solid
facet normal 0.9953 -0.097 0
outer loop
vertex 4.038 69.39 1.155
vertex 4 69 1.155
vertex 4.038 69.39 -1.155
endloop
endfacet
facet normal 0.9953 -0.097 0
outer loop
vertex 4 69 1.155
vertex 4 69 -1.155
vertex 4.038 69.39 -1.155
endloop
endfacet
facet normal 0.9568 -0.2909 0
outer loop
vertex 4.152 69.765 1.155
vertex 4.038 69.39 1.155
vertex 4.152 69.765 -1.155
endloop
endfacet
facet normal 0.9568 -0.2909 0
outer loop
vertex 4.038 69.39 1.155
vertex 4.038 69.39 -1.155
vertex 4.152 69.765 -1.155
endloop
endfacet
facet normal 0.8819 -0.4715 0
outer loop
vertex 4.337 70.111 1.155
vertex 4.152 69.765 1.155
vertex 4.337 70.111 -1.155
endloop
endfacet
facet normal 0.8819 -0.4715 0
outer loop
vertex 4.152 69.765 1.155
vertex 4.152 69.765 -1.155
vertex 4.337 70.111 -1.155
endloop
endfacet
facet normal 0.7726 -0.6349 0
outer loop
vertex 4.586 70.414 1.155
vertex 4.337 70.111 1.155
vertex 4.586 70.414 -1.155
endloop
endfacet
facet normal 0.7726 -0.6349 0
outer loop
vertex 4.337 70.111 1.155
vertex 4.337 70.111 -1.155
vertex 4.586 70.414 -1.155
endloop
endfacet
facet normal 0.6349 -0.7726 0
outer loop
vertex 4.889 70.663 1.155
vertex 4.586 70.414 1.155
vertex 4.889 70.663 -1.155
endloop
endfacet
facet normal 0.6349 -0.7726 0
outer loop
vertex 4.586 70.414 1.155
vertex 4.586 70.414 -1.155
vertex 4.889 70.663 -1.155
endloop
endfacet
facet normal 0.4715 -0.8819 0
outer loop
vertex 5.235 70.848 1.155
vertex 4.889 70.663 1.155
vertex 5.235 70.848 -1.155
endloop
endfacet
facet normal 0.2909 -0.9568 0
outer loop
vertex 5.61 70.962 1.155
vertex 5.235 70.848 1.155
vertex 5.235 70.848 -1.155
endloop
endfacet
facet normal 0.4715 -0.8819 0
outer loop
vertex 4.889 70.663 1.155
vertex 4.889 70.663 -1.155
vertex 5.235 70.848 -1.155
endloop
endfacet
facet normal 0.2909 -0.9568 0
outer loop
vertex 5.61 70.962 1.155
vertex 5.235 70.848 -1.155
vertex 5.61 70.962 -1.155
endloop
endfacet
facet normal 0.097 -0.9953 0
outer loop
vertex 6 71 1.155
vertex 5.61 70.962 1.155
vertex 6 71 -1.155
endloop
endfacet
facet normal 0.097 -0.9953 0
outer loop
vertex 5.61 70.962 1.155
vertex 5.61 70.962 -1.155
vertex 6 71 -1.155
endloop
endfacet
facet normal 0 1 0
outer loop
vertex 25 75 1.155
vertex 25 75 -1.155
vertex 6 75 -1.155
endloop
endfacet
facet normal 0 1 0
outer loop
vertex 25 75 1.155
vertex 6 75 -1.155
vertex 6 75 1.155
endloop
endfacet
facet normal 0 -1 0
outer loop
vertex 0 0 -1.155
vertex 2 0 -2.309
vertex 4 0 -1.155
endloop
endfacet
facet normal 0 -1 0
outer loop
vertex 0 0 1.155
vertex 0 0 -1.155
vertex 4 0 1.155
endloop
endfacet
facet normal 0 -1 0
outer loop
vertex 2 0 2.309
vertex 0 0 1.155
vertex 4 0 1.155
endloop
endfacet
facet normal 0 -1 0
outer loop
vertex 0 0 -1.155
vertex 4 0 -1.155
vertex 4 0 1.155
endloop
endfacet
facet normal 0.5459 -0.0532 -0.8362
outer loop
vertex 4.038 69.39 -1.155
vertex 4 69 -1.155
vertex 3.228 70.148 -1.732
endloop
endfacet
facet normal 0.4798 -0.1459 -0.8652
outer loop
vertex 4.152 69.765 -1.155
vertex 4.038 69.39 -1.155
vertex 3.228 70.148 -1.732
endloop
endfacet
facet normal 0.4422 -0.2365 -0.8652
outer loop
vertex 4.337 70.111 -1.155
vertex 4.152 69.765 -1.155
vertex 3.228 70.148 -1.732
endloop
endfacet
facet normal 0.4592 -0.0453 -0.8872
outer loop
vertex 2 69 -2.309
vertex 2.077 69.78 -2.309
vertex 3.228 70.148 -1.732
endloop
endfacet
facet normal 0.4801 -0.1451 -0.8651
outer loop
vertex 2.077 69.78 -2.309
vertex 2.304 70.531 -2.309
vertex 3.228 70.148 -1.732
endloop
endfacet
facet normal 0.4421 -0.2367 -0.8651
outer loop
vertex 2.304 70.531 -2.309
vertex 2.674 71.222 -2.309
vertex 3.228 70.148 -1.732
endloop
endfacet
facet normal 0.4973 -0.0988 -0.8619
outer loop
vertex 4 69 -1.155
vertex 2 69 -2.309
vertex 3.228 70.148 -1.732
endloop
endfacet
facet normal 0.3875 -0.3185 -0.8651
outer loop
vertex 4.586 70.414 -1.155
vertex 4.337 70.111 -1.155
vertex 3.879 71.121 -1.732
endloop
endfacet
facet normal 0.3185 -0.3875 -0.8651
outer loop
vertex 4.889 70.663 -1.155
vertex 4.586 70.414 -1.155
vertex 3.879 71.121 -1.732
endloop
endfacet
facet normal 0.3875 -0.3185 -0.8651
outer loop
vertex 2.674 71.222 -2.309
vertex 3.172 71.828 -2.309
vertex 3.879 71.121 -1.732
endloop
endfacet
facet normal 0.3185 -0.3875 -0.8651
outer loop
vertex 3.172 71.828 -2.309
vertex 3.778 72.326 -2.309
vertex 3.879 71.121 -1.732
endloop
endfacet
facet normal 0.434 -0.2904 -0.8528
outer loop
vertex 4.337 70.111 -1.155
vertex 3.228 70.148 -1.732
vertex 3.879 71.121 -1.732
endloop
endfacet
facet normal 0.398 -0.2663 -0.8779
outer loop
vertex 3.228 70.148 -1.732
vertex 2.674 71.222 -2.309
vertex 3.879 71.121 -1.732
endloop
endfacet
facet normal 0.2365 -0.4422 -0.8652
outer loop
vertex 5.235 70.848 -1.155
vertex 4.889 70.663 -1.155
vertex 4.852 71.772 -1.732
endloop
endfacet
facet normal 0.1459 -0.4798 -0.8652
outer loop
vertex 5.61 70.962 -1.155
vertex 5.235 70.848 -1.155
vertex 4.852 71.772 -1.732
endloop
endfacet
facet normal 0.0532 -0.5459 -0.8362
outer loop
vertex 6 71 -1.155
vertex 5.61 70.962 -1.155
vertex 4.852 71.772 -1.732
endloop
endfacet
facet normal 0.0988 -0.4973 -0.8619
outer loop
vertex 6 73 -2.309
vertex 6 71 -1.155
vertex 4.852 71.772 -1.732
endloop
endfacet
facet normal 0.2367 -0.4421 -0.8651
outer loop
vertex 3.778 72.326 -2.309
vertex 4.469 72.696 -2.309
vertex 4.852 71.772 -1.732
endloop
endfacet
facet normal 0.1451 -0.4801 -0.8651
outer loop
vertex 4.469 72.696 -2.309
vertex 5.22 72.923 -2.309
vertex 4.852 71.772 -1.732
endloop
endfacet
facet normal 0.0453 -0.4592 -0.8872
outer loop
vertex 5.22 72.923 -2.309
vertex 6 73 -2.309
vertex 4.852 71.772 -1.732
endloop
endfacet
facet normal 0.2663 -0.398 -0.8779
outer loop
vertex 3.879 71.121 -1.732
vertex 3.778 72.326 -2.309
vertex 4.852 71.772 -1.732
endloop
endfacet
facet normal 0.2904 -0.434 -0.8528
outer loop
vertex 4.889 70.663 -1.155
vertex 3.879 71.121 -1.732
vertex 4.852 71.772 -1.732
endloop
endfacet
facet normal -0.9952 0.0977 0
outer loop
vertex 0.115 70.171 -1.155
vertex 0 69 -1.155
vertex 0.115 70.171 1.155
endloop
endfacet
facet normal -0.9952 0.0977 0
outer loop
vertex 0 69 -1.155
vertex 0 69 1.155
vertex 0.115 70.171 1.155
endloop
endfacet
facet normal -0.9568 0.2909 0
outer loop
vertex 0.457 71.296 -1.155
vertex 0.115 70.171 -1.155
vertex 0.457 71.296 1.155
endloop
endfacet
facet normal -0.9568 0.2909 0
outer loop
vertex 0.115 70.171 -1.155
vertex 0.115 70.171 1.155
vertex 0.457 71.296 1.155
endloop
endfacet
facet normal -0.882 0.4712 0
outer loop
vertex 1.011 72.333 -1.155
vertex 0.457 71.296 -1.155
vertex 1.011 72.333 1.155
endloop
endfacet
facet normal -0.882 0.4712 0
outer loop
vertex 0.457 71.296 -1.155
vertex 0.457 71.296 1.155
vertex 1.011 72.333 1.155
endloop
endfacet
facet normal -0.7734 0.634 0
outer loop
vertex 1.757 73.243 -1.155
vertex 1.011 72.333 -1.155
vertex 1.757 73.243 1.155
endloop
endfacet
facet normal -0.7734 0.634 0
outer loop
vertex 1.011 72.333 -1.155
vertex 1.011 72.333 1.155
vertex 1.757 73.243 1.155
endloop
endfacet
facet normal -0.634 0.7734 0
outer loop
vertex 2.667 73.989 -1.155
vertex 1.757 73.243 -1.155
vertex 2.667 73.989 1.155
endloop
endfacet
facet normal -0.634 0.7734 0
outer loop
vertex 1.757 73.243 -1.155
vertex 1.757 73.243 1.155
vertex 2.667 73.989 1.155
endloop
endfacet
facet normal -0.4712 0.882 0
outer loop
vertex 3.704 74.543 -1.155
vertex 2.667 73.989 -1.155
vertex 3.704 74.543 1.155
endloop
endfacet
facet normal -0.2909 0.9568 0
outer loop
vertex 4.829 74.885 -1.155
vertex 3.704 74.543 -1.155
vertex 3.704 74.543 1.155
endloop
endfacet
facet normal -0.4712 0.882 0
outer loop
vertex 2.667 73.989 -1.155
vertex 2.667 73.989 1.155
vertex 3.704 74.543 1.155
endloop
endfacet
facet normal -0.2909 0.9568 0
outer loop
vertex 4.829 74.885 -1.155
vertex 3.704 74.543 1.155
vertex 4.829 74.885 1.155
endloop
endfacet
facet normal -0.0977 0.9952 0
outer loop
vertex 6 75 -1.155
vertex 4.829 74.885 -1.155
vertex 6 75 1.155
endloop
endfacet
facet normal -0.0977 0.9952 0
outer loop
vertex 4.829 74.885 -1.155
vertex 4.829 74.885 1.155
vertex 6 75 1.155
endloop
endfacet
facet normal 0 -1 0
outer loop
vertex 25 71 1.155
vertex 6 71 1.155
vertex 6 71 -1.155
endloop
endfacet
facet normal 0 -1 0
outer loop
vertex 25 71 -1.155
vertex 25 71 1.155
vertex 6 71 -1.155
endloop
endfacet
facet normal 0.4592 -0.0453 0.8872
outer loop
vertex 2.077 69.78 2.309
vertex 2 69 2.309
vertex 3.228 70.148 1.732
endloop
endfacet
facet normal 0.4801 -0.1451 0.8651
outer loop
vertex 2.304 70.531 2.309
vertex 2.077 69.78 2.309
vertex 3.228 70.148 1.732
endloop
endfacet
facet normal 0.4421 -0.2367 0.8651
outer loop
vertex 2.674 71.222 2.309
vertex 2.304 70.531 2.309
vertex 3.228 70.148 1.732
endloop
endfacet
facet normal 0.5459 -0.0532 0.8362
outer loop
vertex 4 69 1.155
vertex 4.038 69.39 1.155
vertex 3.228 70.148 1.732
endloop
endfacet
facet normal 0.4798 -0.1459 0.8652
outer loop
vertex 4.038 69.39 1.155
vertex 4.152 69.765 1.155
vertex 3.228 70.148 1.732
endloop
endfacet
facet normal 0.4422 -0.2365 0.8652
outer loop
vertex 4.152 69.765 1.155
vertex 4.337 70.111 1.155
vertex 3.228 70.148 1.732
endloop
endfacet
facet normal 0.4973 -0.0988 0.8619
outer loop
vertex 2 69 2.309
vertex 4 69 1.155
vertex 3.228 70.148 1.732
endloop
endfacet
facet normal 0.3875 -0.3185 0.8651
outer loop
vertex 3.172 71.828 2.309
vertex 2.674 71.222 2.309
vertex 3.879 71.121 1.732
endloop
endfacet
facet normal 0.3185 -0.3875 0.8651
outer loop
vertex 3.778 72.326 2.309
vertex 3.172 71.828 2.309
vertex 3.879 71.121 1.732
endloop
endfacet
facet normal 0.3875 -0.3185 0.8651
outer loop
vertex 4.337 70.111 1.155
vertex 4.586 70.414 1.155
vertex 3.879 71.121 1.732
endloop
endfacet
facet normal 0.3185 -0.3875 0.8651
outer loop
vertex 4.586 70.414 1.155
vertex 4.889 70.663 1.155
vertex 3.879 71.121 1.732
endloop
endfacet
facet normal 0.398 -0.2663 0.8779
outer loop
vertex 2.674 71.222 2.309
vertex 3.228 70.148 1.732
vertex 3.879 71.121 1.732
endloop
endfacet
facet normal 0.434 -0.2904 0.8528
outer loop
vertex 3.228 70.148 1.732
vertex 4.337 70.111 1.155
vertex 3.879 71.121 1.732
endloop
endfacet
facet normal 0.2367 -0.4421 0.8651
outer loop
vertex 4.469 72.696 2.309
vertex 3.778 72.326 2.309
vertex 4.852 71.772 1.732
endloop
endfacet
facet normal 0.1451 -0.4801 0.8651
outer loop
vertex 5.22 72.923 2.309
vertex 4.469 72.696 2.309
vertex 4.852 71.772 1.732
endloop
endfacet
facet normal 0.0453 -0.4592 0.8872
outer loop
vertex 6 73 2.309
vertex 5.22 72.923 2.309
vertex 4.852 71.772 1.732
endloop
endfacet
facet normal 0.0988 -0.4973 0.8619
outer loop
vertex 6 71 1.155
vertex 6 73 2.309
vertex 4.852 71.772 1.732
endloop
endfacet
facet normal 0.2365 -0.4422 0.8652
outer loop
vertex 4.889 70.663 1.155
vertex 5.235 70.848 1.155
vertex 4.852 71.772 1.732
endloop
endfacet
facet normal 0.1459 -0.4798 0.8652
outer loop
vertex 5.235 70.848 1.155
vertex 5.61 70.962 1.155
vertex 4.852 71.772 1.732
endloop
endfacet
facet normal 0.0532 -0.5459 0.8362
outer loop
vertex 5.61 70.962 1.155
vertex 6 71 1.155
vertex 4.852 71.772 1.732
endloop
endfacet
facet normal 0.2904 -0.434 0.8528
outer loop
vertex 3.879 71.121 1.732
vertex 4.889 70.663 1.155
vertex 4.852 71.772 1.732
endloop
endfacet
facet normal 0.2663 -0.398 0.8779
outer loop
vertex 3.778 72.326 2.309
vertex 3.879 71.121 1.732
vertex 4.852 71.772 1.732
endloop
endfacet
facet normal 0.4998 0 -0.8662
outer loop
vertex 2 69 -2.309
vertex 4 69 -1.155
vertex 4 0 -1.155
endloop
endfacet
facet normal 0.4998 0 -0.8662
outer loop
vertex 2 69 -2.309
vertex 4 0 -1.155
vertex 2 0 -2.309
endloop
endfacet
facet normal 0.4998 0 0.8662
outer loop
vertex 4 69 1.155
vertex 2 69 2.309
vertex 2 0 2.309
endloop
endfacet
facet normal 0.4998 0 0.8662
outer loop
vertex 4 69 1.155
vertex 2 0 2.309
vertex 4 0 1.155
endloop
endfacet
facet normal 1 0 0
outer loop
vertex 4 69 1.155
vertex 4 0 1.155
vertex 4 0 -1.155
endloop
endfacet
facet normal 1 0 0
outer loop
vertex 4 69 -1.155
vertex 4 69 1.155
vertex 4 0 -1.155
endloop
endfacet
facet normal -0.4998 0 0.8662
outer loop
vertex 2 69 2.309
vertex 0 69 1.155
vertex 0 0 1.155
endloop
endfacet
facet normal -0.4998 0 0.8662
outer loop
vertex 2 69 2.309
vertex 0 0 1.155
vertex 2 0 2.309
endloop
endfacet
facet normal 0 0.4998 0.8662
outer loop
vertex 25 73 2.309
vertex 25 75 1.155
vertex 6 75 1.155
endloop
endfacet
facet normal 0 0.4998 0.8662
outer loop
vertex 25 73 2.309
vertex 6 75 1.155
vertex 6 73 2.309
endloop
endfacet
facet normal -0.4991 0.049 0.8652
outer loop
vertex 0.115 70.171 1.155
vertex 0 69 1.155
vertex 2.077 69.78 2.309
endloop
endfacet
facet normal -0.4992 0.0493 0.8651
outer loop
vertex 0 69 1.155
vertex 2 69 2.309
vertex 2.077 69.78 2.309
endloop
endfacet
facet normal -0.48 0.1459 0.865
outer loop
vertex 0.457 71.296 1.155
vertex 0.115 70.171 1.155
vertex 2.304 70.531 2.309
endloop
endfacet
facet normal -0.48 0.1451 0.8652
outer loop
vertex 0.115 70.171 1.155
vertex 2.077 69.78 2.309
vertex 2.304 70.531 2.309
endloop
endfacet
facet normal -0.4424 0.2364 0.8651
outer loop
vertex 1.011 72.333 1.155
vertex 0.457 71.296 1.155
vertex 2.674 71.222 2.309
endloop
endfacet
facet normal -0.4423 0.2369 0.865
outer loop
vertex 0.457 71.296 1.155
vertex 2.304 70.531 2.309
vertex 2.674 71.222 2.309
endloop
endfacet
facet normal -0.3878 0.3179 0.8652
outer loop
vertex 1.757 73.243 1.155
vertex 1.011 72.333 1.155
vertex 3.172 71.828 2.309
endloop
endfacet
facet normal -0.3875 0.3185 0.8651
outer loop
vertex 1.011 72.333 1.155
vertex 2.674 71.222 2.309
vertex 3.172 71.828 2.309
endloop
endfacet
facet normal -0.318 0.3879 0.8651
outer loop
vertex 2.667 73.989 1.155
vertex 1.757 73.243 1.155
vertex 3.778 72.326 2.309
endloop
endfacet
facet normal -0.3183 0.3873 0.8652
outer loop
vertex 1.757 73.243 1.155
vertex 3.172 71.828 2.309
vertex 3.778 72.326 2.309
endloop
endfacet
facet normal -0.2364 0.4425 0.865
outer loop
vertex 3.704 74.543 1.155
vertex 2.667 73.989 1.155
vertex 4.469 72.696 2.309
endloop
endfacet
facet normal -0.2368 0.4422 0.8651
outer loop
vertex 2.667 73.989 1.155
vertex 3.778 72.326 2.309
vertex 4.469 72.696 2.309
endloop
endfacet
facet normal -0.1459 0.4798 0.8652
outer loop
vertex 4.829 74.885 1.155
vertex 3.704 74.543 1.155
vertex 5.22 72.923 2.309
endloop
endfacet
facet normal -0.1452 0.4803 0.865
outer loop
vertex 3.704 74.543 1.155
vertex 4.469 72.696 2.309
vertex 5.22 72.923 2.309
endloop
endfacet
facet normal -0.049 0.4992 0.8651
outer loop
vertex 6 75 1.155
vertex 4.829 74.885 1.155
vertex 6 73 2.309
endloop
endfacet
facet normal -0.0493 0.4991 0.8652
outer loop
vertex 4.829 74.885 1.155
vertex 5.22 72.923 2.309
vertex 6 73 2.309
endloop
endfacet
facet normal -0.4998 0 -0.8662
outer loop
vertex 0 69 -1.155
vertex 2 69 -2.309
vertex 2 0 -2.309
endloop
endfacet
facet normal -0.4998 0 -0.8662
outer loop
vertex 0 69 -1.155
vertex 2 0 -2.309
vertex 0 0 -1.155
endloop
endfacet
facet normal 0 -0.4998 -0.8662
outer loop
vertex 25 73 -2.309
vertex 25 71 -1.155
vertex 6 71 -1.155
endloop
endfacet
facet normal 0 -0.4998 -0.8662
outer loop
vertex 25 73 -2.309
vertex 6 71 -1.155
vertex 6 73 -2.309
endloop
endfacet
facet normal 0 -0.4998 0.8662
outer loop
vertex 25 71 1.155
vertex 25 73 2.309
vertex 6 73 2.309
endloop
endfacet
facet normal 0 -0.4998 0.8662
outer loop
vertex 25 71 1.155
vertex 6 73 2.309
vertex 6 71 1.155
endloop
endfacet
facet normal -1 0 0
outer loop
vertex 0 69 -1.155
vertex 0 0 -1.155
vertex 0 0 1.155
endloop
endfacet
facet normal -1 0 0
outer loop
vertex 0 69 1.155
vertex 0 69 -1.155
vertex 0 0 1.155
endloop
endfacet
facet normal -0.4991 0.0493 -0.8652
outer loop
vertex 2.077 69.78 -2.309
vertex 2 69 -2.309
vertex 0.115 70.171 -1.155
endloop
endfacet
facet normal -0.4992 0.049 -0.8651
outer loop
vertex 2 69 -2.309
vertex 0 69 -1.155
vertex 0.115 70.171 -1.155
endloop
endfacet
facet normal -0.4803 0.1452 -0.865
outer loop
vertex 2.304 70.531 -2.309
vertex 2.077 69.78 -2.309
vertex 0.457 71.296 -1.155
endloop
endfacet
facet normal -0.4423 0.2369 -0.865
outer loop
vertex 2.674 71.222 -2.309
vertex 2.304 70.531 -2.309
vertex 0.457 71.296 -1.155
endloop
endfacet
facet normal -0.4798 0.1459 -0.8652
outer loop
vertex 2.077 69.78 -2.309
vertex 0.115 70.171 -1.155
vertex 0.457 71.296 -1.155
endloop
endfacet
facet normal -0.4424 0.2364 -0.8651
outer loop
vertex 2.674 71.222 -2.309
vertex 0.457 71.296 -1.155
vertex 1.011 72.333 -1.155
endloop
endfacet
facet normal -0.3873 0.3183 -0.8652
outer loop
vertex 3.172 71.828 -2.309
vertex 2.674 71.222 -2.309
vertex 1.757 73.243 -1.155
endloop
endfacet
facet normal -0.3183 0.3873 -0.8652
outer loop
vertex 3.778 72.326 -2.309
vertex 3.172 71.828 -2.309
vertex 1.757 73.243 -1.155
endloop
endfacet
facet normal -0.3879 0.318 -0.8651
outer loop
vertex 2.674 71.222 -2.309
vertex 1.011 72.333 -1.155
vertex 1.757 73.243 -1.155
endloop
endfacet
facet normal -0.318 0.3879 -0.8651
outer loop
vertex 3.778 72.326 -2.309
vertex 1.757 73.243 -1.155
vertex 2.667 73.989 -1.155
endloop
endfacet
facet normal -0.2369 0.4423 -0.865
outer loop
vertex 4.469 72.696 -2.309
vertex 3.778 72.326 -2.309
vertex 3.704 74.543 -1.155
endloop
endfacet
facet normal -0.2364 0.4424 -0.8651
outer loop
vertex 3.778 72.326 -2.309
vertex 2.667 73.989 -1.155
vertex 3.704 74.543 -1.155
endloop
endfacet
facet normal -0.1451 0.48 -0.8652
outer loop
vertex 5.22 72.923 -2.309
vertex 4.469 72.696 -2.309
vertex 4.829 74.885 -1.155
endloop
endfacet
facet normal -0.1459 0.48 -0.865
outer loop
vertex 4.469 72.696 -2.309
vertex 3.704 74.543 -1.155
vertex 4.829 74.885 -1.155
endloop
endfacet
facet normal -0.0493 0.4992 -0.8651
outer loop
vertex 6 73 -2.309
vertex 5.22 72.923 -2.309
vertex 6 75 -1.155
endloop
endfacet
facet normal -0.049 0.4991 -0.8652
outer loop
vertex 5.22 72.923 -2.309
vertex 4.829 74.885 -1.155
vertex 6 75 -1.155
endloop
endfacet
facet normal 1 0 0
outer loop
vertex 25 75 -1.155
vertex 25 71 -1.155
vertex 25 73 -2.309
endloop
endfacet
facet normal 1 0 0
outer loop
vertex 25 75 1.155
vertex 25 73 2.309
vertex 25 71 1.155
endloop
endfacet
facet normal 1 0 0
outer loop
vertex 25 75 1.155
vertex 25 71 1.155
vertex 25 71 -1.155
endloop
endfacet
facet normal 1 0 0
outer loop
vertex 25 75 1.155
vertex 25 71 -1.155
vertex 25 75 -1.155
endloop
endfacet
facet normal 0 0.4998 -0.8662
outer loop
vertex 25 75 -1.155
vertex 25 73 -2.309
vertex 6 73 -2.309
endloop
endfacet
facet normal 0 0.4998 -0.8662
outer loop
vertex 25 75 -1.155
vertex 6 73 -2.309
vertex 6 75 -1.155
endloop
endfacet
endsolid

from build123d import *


with BuildPart() as part:
    # Sweep1: sweep along a path in Sketch2
    with BuildLine(Plane.XY) as sweep1_path:
        Line((0, 0), (0, 69))
        ThreePointArc((0, 69), (1.757359313, 73.242640687), (6, 75))
        Line((6, 75), (25, 75))
    # Sketch3 → Sweep1 (sweep)
    with BuildSketch(Plane(origin=(0, 0, 0), x_dir=(1, 0, 0), z_dir=(0, 1, 0))):
        Polygon((2, 2.309401077), (0, 1.154700538), (0, -1.154700538), (2, -2.309401077), (4, -1.154700538), (4, 1.154700538), align=None)
    sweep(path=sweep1_path.line)


solid = part.part
